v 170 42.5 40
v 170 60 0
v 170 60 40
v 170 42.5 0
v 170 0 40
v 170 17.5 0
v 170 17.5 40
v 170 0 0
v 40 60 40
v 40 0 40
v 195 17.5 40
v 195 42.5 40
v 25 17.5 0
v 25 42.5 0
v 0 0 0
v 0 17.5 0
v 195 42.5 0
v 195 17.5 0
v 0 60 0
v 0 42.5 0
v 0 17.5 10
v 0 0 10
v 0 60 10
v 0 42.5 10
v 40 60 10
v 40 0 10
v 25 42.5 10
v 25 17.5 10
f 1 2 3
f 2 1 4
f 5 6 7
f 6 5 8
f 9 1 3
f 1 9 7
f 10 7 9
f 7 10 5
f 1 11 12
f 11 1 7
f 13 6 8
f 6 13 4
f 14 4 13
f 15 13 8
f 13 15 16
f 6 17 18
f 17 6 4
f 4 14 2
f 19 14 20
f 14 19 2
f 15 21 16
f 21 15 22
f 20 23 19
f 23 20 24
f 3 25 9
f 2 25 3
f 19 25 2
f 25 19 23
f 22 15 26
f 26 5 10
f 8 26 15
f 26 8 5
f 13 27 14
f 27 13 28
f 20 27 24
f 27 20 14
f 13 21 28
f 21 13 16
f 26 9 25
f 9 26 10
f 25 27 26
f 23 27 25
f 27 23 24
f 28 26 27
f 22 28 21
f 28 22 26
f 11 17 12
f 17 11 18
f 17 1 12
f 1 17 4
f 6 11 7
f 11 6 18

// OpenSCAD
LenX=170;
WidthY=60;
HightZ=40;
Buff=5;
DB=Buff*2;
FeetDia=25;
YSpace=(WidthY-FeetDia)/2;
LipH=10;
Feet2Lip=15;
LipLen=Feet2Lip+FeetDia+Buff;

difference()
{
  cube([LenX,WidthY,HightZ]);
  translate([-Buff,YSpace,-Buff]) cube([FeetDia+Buff,FeetDia,HightZ+DB]);
  translate([-Buff,-Buff,LipH]) cube([LipLen,WidthY+DB,HightZ]);
}
translate([LenX,YSpace,0]) cube([FeetDia,FeetDia,HightZ]);

*difference()
{
  cube([50,45,40]);
  *translate([-1,-2,-1]) cube([17,50,35]);
  translate([25,10,-1]) cube([40,25,50]);
  translate([10,-1,10]) cube([85,50,60]);
}
